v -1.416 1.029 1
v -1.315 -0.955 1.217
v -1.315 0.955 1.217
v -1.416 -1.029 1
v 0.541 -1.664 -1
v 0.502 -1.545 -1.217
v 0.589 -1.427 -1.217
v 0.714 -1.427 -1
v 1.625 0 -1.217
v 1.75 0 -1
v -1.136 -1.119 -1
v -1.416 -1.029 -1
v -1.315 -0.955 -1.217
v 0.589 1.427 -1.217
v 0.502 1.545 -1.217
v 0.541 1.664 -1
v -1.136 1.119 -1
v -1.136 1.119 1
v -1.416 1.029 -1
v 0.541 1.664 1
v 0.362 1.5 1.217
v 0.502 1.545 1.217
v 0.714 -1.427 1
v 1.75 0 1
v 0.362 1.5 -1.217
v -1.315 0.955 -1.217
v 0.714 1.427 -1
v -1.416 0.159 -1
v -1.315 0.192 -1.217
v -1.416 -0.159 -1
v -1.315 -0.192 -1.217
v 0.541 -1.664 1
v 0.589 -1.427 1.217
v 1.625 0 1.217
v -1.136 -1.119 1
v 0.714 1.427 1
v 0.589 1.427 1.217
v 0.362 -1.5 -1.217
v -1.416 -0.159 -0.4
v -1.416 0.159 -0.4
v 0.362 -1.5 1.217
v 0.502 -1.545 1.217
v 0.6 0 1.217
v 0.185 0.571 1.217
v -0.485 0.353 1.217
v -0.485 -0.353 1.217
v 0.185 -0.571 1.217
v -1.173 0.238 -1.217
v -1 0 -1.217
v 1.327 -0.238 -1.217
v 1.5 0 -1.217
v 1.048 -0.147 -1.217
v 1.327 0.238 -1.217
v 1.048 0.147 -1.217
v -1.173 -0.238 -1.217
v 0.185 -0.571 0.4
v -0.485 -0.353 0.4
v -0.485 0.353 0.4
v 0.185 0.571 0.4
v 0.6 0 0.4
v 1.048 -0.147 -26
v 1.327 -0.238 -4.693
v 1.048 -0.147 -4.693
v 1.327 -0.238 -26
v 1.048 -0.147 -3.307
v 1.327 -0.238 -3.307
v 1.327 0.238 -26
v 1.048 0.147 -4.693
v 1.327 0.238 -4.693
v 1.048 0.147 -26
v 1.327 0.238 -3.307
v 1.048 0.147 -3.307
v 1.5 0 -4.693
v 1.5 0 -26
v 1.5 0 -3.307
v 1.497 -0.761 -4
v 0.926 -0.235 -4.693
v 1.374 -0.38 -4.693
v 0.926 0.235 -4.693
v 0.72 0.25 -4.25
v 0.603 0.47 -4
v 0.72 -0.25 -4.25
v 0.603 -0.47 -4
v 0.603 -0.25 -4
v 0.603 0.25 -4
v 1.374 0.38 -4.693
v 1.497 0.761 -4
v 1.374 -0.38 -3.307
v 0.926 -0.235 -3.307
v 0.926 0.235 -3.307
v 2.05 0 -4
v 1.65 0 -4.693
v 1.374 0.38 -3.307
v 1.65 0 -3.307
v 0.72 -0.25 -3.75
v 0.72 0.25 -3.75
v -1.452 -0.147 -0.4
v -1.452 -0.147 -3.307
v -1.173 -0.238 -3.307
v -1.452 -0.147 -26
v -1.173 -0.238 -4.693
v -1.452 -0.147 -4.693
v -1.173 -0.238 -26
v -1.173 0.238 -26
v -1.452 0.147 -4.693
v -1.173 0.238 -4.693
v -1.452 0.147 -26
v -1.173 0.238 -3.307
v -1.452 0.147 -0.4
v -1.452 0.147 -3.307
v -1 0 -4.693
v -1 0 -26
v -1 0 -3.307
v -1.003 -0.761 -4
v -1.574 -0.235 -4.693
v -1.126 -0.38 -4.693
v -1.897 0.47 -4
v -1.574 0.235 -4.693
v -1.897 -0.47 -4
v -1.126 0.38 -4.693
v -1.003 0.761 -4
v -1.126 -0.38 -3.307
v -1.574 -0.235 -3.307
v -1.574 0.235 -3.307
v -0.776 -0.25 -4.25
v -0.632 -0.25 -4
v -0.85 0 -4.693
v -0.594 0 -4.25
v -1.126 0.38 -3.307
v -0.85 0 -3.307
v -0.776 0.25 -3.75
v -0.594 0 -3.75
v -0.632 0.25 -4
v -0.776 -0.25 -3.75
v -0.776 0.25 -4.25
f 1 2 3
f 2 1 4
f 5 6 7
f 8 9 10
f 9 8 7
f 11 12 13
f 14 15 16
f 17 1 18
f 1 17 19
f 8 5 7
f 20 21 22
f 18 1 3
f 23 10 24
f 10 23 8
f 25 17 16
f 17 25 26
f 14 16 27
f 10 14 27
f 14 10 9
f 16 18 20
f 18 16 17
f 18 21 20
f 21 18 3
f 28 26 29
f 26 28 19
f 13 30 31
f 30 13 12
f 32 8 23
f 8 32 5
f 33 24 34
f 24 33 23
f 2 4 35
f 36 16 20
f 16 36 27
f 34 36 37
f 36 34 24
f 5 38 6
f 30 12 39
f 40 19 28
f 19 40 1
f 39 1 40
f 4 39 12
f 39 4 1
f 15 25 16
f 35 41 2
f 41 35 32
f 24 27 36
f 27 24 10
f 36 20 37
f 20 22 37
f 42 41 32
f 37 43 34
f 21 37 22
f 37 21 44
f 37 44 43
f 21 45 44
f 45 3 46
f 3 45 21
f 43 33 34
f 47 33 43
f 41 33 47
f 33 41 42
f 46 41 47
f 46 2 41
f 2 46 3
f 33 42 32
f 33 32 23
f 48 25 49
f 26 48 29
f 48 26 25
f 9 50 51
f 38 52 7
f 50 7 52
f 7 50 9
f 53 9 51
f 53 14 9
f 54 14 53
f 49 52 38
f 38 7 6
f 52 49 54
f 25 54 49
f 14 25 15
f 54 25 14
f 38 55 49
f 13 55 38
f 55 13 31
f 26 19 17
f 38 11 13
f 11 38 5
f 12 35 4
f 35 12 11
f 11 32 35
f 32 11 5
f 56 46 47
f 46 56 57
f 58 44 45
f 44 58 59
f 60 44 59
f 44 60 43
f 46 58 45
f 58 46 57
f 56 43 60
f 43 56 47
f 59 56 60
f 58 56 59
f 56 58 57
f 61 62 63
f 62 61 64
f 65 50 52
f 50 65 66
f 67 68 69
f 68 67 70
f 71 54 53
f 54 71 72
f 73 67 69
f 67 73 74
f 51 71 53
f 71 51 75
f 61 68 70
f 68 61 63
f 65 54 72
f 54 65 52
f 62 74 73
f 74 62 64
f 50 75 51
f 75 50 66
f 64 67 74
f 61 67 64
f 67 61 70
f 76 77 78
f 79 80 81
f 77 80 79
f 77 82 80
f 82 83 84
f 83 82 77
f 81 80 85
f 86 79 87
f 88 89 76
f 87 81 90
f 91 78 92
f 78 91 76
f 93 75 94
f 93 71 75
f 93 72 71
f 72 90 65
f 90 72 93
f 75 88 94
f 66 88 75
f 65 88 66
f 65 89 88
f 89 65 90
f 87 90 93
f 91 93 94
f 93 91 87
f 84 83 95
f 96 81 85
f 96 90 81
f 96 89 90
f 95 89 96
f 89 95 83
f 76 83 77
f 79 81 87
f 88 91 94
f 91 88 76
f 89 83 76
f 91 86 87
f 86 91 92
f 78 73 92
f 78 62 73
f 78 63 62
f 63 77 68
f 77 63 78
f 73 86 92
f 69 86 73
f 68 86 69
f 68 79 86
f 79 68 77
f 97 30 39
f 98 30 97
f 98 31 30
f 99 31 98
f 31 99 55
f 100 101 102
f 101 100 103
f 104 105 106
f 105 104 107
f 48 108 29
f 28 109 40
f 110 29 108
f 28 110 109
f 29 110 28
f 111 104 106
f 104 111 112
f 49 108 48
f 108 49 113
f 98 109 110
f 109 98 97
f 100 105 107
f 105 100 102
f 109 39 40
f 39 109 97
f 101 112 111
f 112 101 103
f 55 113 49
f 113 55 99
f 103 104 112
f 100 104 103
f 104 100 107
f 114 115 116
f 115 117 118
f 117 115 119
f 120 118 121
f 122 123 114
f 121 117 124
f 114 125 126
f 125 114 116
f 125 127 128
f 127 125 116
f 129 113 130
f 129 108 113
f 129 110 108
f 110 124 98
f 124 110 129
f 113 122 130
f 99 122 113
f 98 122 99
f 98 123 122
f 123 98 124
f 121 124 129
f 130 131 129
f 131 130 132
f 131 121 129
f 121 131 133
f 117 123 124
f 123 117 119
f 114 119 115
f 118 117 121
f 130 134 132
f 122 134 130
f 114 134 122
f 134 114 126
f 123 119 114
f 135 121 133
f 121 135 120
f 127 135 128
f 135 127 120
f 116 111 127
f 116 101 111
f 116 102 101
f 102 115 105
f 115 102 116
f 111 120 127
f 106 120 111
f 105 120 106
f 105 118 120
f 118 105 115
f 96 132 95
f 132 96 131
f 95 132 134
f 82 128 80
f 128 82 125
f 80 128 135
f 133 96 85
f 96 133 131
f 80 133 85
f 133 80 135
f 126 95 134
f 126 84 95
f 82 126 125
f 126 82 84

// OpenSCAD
// Parameters
body_d = 3.0; //[1.5:6.0:0.1]
body_t = 2.0; //[1.0:4.0:0.1]
lead_d = 0.5; //[0.25:1.0:0.05]
lead_pitch = 2.5; //[1.25:5.0:0.1]
lead_len = 25.0; //[12.5:50.0:0.5]
lead_straight_from_body = 3.0; //[1.5:6.0:0.1]
lead_bend_r = 0.8; //[0.4:1.6:0.05]
overlap = 0.8; //[0.3:2.0:0.1]
lead_embed = 0.6; //[0.2:1.5:0.1]
tinning_len = 3.0; //[1.5:6.0:0.1]
marking_depth = 0.2; //[0.1:0.5:0.05]
marking_d = 1.2; //[0.6:2.4:0.1]
edge_fillet_r = 0.25; //[0.1:0.6:0.05]

// Base Shapes
module thermistor_body_raw() {
  cylinder(r=body_d/2, h=body_t, center=true);
}

module fillets_chamfers_sphere() {
  sphere(r=edge_fillet_r, center=true);
}

module body_marking_cutter() {
  translate([0, 0, body_t/2 - marking_depth/2])
    cylinder(r=marking_d/2, h=marking_depth + overlap, center=true);
}

module lead_1_straight() {
  translate([lead_pitch/2, 0, -(body_t/2) - (lead_len + lead_embed)/2 + lead_embed])
    cylinder(r=lead_d/2, h=lead_len + lead_embed, center=true);
}

module lead_2_straight() {
  translate([-lead_pitch/2, 0, -(body_t/2) - (lead_len + lead_embed)/2 + lead_embed])
    cylinder(r=lead_d/2, h=lead_len + lead_embed, center=true);
}

module lead_bend_knee_1() {
  translate([lead_pitch/2, 0, -(body_t/2) - lead_straight_from_body])
    sphere(r=lead_bend_r, center=true);
}

module lead_bend_knee_2() {
  translate([-lead_pitch/2, 0, -(body_t/2) - lead_straight_from_body])
    sphere(r=lead_bend_r, center=true);
}

module lead_tinning_tip_1() {
  translate([lead_pitch/2, 0, -(body_t/2) - lead_len + tinning_len/2])
    cylinder(r=lead_d/2, h=tinning_len, center=true);
}

module lead_tinning_tip_2() {
  translate([-lead_pitch/2, 0, -(body_t/2) - lead_len + tinning_len/2])
    cylinder(r=lead_d/2, h=tinning_len, center=true);
}

module lead_spacing_reference() {
  translate([0, 0, -(body_t/2) - lead_straight_from_body])
    cube([lead_pitch + lead_d, lead_d, lead_d], center=true);
}

// Operations
module fillets_chamfers() {
  minkowski() {
    thermistor_body_raw();
    fillets_chamfers_sphere();
  }
}

module thermistor_body() {
  difference() {
    fillets_chamfers();
    body_marking_cutter();
  }
}

module lead_1() {
  union() {
    lead_1_straight();
    lead_bend_knee_1();
    lead_tinning_tip_1();
  }
}

module lead_2() {
  union() {
    lead_2_straight();
    lead_bend_knee_2();
    lead_tinning_tip_2();
  }
}

module complete_model() {
  union() {
    thermistor_body();
    lead_1();
    lead_2();
    lead_spacing_reference();
  }
}

// Final Output
complete_model();
